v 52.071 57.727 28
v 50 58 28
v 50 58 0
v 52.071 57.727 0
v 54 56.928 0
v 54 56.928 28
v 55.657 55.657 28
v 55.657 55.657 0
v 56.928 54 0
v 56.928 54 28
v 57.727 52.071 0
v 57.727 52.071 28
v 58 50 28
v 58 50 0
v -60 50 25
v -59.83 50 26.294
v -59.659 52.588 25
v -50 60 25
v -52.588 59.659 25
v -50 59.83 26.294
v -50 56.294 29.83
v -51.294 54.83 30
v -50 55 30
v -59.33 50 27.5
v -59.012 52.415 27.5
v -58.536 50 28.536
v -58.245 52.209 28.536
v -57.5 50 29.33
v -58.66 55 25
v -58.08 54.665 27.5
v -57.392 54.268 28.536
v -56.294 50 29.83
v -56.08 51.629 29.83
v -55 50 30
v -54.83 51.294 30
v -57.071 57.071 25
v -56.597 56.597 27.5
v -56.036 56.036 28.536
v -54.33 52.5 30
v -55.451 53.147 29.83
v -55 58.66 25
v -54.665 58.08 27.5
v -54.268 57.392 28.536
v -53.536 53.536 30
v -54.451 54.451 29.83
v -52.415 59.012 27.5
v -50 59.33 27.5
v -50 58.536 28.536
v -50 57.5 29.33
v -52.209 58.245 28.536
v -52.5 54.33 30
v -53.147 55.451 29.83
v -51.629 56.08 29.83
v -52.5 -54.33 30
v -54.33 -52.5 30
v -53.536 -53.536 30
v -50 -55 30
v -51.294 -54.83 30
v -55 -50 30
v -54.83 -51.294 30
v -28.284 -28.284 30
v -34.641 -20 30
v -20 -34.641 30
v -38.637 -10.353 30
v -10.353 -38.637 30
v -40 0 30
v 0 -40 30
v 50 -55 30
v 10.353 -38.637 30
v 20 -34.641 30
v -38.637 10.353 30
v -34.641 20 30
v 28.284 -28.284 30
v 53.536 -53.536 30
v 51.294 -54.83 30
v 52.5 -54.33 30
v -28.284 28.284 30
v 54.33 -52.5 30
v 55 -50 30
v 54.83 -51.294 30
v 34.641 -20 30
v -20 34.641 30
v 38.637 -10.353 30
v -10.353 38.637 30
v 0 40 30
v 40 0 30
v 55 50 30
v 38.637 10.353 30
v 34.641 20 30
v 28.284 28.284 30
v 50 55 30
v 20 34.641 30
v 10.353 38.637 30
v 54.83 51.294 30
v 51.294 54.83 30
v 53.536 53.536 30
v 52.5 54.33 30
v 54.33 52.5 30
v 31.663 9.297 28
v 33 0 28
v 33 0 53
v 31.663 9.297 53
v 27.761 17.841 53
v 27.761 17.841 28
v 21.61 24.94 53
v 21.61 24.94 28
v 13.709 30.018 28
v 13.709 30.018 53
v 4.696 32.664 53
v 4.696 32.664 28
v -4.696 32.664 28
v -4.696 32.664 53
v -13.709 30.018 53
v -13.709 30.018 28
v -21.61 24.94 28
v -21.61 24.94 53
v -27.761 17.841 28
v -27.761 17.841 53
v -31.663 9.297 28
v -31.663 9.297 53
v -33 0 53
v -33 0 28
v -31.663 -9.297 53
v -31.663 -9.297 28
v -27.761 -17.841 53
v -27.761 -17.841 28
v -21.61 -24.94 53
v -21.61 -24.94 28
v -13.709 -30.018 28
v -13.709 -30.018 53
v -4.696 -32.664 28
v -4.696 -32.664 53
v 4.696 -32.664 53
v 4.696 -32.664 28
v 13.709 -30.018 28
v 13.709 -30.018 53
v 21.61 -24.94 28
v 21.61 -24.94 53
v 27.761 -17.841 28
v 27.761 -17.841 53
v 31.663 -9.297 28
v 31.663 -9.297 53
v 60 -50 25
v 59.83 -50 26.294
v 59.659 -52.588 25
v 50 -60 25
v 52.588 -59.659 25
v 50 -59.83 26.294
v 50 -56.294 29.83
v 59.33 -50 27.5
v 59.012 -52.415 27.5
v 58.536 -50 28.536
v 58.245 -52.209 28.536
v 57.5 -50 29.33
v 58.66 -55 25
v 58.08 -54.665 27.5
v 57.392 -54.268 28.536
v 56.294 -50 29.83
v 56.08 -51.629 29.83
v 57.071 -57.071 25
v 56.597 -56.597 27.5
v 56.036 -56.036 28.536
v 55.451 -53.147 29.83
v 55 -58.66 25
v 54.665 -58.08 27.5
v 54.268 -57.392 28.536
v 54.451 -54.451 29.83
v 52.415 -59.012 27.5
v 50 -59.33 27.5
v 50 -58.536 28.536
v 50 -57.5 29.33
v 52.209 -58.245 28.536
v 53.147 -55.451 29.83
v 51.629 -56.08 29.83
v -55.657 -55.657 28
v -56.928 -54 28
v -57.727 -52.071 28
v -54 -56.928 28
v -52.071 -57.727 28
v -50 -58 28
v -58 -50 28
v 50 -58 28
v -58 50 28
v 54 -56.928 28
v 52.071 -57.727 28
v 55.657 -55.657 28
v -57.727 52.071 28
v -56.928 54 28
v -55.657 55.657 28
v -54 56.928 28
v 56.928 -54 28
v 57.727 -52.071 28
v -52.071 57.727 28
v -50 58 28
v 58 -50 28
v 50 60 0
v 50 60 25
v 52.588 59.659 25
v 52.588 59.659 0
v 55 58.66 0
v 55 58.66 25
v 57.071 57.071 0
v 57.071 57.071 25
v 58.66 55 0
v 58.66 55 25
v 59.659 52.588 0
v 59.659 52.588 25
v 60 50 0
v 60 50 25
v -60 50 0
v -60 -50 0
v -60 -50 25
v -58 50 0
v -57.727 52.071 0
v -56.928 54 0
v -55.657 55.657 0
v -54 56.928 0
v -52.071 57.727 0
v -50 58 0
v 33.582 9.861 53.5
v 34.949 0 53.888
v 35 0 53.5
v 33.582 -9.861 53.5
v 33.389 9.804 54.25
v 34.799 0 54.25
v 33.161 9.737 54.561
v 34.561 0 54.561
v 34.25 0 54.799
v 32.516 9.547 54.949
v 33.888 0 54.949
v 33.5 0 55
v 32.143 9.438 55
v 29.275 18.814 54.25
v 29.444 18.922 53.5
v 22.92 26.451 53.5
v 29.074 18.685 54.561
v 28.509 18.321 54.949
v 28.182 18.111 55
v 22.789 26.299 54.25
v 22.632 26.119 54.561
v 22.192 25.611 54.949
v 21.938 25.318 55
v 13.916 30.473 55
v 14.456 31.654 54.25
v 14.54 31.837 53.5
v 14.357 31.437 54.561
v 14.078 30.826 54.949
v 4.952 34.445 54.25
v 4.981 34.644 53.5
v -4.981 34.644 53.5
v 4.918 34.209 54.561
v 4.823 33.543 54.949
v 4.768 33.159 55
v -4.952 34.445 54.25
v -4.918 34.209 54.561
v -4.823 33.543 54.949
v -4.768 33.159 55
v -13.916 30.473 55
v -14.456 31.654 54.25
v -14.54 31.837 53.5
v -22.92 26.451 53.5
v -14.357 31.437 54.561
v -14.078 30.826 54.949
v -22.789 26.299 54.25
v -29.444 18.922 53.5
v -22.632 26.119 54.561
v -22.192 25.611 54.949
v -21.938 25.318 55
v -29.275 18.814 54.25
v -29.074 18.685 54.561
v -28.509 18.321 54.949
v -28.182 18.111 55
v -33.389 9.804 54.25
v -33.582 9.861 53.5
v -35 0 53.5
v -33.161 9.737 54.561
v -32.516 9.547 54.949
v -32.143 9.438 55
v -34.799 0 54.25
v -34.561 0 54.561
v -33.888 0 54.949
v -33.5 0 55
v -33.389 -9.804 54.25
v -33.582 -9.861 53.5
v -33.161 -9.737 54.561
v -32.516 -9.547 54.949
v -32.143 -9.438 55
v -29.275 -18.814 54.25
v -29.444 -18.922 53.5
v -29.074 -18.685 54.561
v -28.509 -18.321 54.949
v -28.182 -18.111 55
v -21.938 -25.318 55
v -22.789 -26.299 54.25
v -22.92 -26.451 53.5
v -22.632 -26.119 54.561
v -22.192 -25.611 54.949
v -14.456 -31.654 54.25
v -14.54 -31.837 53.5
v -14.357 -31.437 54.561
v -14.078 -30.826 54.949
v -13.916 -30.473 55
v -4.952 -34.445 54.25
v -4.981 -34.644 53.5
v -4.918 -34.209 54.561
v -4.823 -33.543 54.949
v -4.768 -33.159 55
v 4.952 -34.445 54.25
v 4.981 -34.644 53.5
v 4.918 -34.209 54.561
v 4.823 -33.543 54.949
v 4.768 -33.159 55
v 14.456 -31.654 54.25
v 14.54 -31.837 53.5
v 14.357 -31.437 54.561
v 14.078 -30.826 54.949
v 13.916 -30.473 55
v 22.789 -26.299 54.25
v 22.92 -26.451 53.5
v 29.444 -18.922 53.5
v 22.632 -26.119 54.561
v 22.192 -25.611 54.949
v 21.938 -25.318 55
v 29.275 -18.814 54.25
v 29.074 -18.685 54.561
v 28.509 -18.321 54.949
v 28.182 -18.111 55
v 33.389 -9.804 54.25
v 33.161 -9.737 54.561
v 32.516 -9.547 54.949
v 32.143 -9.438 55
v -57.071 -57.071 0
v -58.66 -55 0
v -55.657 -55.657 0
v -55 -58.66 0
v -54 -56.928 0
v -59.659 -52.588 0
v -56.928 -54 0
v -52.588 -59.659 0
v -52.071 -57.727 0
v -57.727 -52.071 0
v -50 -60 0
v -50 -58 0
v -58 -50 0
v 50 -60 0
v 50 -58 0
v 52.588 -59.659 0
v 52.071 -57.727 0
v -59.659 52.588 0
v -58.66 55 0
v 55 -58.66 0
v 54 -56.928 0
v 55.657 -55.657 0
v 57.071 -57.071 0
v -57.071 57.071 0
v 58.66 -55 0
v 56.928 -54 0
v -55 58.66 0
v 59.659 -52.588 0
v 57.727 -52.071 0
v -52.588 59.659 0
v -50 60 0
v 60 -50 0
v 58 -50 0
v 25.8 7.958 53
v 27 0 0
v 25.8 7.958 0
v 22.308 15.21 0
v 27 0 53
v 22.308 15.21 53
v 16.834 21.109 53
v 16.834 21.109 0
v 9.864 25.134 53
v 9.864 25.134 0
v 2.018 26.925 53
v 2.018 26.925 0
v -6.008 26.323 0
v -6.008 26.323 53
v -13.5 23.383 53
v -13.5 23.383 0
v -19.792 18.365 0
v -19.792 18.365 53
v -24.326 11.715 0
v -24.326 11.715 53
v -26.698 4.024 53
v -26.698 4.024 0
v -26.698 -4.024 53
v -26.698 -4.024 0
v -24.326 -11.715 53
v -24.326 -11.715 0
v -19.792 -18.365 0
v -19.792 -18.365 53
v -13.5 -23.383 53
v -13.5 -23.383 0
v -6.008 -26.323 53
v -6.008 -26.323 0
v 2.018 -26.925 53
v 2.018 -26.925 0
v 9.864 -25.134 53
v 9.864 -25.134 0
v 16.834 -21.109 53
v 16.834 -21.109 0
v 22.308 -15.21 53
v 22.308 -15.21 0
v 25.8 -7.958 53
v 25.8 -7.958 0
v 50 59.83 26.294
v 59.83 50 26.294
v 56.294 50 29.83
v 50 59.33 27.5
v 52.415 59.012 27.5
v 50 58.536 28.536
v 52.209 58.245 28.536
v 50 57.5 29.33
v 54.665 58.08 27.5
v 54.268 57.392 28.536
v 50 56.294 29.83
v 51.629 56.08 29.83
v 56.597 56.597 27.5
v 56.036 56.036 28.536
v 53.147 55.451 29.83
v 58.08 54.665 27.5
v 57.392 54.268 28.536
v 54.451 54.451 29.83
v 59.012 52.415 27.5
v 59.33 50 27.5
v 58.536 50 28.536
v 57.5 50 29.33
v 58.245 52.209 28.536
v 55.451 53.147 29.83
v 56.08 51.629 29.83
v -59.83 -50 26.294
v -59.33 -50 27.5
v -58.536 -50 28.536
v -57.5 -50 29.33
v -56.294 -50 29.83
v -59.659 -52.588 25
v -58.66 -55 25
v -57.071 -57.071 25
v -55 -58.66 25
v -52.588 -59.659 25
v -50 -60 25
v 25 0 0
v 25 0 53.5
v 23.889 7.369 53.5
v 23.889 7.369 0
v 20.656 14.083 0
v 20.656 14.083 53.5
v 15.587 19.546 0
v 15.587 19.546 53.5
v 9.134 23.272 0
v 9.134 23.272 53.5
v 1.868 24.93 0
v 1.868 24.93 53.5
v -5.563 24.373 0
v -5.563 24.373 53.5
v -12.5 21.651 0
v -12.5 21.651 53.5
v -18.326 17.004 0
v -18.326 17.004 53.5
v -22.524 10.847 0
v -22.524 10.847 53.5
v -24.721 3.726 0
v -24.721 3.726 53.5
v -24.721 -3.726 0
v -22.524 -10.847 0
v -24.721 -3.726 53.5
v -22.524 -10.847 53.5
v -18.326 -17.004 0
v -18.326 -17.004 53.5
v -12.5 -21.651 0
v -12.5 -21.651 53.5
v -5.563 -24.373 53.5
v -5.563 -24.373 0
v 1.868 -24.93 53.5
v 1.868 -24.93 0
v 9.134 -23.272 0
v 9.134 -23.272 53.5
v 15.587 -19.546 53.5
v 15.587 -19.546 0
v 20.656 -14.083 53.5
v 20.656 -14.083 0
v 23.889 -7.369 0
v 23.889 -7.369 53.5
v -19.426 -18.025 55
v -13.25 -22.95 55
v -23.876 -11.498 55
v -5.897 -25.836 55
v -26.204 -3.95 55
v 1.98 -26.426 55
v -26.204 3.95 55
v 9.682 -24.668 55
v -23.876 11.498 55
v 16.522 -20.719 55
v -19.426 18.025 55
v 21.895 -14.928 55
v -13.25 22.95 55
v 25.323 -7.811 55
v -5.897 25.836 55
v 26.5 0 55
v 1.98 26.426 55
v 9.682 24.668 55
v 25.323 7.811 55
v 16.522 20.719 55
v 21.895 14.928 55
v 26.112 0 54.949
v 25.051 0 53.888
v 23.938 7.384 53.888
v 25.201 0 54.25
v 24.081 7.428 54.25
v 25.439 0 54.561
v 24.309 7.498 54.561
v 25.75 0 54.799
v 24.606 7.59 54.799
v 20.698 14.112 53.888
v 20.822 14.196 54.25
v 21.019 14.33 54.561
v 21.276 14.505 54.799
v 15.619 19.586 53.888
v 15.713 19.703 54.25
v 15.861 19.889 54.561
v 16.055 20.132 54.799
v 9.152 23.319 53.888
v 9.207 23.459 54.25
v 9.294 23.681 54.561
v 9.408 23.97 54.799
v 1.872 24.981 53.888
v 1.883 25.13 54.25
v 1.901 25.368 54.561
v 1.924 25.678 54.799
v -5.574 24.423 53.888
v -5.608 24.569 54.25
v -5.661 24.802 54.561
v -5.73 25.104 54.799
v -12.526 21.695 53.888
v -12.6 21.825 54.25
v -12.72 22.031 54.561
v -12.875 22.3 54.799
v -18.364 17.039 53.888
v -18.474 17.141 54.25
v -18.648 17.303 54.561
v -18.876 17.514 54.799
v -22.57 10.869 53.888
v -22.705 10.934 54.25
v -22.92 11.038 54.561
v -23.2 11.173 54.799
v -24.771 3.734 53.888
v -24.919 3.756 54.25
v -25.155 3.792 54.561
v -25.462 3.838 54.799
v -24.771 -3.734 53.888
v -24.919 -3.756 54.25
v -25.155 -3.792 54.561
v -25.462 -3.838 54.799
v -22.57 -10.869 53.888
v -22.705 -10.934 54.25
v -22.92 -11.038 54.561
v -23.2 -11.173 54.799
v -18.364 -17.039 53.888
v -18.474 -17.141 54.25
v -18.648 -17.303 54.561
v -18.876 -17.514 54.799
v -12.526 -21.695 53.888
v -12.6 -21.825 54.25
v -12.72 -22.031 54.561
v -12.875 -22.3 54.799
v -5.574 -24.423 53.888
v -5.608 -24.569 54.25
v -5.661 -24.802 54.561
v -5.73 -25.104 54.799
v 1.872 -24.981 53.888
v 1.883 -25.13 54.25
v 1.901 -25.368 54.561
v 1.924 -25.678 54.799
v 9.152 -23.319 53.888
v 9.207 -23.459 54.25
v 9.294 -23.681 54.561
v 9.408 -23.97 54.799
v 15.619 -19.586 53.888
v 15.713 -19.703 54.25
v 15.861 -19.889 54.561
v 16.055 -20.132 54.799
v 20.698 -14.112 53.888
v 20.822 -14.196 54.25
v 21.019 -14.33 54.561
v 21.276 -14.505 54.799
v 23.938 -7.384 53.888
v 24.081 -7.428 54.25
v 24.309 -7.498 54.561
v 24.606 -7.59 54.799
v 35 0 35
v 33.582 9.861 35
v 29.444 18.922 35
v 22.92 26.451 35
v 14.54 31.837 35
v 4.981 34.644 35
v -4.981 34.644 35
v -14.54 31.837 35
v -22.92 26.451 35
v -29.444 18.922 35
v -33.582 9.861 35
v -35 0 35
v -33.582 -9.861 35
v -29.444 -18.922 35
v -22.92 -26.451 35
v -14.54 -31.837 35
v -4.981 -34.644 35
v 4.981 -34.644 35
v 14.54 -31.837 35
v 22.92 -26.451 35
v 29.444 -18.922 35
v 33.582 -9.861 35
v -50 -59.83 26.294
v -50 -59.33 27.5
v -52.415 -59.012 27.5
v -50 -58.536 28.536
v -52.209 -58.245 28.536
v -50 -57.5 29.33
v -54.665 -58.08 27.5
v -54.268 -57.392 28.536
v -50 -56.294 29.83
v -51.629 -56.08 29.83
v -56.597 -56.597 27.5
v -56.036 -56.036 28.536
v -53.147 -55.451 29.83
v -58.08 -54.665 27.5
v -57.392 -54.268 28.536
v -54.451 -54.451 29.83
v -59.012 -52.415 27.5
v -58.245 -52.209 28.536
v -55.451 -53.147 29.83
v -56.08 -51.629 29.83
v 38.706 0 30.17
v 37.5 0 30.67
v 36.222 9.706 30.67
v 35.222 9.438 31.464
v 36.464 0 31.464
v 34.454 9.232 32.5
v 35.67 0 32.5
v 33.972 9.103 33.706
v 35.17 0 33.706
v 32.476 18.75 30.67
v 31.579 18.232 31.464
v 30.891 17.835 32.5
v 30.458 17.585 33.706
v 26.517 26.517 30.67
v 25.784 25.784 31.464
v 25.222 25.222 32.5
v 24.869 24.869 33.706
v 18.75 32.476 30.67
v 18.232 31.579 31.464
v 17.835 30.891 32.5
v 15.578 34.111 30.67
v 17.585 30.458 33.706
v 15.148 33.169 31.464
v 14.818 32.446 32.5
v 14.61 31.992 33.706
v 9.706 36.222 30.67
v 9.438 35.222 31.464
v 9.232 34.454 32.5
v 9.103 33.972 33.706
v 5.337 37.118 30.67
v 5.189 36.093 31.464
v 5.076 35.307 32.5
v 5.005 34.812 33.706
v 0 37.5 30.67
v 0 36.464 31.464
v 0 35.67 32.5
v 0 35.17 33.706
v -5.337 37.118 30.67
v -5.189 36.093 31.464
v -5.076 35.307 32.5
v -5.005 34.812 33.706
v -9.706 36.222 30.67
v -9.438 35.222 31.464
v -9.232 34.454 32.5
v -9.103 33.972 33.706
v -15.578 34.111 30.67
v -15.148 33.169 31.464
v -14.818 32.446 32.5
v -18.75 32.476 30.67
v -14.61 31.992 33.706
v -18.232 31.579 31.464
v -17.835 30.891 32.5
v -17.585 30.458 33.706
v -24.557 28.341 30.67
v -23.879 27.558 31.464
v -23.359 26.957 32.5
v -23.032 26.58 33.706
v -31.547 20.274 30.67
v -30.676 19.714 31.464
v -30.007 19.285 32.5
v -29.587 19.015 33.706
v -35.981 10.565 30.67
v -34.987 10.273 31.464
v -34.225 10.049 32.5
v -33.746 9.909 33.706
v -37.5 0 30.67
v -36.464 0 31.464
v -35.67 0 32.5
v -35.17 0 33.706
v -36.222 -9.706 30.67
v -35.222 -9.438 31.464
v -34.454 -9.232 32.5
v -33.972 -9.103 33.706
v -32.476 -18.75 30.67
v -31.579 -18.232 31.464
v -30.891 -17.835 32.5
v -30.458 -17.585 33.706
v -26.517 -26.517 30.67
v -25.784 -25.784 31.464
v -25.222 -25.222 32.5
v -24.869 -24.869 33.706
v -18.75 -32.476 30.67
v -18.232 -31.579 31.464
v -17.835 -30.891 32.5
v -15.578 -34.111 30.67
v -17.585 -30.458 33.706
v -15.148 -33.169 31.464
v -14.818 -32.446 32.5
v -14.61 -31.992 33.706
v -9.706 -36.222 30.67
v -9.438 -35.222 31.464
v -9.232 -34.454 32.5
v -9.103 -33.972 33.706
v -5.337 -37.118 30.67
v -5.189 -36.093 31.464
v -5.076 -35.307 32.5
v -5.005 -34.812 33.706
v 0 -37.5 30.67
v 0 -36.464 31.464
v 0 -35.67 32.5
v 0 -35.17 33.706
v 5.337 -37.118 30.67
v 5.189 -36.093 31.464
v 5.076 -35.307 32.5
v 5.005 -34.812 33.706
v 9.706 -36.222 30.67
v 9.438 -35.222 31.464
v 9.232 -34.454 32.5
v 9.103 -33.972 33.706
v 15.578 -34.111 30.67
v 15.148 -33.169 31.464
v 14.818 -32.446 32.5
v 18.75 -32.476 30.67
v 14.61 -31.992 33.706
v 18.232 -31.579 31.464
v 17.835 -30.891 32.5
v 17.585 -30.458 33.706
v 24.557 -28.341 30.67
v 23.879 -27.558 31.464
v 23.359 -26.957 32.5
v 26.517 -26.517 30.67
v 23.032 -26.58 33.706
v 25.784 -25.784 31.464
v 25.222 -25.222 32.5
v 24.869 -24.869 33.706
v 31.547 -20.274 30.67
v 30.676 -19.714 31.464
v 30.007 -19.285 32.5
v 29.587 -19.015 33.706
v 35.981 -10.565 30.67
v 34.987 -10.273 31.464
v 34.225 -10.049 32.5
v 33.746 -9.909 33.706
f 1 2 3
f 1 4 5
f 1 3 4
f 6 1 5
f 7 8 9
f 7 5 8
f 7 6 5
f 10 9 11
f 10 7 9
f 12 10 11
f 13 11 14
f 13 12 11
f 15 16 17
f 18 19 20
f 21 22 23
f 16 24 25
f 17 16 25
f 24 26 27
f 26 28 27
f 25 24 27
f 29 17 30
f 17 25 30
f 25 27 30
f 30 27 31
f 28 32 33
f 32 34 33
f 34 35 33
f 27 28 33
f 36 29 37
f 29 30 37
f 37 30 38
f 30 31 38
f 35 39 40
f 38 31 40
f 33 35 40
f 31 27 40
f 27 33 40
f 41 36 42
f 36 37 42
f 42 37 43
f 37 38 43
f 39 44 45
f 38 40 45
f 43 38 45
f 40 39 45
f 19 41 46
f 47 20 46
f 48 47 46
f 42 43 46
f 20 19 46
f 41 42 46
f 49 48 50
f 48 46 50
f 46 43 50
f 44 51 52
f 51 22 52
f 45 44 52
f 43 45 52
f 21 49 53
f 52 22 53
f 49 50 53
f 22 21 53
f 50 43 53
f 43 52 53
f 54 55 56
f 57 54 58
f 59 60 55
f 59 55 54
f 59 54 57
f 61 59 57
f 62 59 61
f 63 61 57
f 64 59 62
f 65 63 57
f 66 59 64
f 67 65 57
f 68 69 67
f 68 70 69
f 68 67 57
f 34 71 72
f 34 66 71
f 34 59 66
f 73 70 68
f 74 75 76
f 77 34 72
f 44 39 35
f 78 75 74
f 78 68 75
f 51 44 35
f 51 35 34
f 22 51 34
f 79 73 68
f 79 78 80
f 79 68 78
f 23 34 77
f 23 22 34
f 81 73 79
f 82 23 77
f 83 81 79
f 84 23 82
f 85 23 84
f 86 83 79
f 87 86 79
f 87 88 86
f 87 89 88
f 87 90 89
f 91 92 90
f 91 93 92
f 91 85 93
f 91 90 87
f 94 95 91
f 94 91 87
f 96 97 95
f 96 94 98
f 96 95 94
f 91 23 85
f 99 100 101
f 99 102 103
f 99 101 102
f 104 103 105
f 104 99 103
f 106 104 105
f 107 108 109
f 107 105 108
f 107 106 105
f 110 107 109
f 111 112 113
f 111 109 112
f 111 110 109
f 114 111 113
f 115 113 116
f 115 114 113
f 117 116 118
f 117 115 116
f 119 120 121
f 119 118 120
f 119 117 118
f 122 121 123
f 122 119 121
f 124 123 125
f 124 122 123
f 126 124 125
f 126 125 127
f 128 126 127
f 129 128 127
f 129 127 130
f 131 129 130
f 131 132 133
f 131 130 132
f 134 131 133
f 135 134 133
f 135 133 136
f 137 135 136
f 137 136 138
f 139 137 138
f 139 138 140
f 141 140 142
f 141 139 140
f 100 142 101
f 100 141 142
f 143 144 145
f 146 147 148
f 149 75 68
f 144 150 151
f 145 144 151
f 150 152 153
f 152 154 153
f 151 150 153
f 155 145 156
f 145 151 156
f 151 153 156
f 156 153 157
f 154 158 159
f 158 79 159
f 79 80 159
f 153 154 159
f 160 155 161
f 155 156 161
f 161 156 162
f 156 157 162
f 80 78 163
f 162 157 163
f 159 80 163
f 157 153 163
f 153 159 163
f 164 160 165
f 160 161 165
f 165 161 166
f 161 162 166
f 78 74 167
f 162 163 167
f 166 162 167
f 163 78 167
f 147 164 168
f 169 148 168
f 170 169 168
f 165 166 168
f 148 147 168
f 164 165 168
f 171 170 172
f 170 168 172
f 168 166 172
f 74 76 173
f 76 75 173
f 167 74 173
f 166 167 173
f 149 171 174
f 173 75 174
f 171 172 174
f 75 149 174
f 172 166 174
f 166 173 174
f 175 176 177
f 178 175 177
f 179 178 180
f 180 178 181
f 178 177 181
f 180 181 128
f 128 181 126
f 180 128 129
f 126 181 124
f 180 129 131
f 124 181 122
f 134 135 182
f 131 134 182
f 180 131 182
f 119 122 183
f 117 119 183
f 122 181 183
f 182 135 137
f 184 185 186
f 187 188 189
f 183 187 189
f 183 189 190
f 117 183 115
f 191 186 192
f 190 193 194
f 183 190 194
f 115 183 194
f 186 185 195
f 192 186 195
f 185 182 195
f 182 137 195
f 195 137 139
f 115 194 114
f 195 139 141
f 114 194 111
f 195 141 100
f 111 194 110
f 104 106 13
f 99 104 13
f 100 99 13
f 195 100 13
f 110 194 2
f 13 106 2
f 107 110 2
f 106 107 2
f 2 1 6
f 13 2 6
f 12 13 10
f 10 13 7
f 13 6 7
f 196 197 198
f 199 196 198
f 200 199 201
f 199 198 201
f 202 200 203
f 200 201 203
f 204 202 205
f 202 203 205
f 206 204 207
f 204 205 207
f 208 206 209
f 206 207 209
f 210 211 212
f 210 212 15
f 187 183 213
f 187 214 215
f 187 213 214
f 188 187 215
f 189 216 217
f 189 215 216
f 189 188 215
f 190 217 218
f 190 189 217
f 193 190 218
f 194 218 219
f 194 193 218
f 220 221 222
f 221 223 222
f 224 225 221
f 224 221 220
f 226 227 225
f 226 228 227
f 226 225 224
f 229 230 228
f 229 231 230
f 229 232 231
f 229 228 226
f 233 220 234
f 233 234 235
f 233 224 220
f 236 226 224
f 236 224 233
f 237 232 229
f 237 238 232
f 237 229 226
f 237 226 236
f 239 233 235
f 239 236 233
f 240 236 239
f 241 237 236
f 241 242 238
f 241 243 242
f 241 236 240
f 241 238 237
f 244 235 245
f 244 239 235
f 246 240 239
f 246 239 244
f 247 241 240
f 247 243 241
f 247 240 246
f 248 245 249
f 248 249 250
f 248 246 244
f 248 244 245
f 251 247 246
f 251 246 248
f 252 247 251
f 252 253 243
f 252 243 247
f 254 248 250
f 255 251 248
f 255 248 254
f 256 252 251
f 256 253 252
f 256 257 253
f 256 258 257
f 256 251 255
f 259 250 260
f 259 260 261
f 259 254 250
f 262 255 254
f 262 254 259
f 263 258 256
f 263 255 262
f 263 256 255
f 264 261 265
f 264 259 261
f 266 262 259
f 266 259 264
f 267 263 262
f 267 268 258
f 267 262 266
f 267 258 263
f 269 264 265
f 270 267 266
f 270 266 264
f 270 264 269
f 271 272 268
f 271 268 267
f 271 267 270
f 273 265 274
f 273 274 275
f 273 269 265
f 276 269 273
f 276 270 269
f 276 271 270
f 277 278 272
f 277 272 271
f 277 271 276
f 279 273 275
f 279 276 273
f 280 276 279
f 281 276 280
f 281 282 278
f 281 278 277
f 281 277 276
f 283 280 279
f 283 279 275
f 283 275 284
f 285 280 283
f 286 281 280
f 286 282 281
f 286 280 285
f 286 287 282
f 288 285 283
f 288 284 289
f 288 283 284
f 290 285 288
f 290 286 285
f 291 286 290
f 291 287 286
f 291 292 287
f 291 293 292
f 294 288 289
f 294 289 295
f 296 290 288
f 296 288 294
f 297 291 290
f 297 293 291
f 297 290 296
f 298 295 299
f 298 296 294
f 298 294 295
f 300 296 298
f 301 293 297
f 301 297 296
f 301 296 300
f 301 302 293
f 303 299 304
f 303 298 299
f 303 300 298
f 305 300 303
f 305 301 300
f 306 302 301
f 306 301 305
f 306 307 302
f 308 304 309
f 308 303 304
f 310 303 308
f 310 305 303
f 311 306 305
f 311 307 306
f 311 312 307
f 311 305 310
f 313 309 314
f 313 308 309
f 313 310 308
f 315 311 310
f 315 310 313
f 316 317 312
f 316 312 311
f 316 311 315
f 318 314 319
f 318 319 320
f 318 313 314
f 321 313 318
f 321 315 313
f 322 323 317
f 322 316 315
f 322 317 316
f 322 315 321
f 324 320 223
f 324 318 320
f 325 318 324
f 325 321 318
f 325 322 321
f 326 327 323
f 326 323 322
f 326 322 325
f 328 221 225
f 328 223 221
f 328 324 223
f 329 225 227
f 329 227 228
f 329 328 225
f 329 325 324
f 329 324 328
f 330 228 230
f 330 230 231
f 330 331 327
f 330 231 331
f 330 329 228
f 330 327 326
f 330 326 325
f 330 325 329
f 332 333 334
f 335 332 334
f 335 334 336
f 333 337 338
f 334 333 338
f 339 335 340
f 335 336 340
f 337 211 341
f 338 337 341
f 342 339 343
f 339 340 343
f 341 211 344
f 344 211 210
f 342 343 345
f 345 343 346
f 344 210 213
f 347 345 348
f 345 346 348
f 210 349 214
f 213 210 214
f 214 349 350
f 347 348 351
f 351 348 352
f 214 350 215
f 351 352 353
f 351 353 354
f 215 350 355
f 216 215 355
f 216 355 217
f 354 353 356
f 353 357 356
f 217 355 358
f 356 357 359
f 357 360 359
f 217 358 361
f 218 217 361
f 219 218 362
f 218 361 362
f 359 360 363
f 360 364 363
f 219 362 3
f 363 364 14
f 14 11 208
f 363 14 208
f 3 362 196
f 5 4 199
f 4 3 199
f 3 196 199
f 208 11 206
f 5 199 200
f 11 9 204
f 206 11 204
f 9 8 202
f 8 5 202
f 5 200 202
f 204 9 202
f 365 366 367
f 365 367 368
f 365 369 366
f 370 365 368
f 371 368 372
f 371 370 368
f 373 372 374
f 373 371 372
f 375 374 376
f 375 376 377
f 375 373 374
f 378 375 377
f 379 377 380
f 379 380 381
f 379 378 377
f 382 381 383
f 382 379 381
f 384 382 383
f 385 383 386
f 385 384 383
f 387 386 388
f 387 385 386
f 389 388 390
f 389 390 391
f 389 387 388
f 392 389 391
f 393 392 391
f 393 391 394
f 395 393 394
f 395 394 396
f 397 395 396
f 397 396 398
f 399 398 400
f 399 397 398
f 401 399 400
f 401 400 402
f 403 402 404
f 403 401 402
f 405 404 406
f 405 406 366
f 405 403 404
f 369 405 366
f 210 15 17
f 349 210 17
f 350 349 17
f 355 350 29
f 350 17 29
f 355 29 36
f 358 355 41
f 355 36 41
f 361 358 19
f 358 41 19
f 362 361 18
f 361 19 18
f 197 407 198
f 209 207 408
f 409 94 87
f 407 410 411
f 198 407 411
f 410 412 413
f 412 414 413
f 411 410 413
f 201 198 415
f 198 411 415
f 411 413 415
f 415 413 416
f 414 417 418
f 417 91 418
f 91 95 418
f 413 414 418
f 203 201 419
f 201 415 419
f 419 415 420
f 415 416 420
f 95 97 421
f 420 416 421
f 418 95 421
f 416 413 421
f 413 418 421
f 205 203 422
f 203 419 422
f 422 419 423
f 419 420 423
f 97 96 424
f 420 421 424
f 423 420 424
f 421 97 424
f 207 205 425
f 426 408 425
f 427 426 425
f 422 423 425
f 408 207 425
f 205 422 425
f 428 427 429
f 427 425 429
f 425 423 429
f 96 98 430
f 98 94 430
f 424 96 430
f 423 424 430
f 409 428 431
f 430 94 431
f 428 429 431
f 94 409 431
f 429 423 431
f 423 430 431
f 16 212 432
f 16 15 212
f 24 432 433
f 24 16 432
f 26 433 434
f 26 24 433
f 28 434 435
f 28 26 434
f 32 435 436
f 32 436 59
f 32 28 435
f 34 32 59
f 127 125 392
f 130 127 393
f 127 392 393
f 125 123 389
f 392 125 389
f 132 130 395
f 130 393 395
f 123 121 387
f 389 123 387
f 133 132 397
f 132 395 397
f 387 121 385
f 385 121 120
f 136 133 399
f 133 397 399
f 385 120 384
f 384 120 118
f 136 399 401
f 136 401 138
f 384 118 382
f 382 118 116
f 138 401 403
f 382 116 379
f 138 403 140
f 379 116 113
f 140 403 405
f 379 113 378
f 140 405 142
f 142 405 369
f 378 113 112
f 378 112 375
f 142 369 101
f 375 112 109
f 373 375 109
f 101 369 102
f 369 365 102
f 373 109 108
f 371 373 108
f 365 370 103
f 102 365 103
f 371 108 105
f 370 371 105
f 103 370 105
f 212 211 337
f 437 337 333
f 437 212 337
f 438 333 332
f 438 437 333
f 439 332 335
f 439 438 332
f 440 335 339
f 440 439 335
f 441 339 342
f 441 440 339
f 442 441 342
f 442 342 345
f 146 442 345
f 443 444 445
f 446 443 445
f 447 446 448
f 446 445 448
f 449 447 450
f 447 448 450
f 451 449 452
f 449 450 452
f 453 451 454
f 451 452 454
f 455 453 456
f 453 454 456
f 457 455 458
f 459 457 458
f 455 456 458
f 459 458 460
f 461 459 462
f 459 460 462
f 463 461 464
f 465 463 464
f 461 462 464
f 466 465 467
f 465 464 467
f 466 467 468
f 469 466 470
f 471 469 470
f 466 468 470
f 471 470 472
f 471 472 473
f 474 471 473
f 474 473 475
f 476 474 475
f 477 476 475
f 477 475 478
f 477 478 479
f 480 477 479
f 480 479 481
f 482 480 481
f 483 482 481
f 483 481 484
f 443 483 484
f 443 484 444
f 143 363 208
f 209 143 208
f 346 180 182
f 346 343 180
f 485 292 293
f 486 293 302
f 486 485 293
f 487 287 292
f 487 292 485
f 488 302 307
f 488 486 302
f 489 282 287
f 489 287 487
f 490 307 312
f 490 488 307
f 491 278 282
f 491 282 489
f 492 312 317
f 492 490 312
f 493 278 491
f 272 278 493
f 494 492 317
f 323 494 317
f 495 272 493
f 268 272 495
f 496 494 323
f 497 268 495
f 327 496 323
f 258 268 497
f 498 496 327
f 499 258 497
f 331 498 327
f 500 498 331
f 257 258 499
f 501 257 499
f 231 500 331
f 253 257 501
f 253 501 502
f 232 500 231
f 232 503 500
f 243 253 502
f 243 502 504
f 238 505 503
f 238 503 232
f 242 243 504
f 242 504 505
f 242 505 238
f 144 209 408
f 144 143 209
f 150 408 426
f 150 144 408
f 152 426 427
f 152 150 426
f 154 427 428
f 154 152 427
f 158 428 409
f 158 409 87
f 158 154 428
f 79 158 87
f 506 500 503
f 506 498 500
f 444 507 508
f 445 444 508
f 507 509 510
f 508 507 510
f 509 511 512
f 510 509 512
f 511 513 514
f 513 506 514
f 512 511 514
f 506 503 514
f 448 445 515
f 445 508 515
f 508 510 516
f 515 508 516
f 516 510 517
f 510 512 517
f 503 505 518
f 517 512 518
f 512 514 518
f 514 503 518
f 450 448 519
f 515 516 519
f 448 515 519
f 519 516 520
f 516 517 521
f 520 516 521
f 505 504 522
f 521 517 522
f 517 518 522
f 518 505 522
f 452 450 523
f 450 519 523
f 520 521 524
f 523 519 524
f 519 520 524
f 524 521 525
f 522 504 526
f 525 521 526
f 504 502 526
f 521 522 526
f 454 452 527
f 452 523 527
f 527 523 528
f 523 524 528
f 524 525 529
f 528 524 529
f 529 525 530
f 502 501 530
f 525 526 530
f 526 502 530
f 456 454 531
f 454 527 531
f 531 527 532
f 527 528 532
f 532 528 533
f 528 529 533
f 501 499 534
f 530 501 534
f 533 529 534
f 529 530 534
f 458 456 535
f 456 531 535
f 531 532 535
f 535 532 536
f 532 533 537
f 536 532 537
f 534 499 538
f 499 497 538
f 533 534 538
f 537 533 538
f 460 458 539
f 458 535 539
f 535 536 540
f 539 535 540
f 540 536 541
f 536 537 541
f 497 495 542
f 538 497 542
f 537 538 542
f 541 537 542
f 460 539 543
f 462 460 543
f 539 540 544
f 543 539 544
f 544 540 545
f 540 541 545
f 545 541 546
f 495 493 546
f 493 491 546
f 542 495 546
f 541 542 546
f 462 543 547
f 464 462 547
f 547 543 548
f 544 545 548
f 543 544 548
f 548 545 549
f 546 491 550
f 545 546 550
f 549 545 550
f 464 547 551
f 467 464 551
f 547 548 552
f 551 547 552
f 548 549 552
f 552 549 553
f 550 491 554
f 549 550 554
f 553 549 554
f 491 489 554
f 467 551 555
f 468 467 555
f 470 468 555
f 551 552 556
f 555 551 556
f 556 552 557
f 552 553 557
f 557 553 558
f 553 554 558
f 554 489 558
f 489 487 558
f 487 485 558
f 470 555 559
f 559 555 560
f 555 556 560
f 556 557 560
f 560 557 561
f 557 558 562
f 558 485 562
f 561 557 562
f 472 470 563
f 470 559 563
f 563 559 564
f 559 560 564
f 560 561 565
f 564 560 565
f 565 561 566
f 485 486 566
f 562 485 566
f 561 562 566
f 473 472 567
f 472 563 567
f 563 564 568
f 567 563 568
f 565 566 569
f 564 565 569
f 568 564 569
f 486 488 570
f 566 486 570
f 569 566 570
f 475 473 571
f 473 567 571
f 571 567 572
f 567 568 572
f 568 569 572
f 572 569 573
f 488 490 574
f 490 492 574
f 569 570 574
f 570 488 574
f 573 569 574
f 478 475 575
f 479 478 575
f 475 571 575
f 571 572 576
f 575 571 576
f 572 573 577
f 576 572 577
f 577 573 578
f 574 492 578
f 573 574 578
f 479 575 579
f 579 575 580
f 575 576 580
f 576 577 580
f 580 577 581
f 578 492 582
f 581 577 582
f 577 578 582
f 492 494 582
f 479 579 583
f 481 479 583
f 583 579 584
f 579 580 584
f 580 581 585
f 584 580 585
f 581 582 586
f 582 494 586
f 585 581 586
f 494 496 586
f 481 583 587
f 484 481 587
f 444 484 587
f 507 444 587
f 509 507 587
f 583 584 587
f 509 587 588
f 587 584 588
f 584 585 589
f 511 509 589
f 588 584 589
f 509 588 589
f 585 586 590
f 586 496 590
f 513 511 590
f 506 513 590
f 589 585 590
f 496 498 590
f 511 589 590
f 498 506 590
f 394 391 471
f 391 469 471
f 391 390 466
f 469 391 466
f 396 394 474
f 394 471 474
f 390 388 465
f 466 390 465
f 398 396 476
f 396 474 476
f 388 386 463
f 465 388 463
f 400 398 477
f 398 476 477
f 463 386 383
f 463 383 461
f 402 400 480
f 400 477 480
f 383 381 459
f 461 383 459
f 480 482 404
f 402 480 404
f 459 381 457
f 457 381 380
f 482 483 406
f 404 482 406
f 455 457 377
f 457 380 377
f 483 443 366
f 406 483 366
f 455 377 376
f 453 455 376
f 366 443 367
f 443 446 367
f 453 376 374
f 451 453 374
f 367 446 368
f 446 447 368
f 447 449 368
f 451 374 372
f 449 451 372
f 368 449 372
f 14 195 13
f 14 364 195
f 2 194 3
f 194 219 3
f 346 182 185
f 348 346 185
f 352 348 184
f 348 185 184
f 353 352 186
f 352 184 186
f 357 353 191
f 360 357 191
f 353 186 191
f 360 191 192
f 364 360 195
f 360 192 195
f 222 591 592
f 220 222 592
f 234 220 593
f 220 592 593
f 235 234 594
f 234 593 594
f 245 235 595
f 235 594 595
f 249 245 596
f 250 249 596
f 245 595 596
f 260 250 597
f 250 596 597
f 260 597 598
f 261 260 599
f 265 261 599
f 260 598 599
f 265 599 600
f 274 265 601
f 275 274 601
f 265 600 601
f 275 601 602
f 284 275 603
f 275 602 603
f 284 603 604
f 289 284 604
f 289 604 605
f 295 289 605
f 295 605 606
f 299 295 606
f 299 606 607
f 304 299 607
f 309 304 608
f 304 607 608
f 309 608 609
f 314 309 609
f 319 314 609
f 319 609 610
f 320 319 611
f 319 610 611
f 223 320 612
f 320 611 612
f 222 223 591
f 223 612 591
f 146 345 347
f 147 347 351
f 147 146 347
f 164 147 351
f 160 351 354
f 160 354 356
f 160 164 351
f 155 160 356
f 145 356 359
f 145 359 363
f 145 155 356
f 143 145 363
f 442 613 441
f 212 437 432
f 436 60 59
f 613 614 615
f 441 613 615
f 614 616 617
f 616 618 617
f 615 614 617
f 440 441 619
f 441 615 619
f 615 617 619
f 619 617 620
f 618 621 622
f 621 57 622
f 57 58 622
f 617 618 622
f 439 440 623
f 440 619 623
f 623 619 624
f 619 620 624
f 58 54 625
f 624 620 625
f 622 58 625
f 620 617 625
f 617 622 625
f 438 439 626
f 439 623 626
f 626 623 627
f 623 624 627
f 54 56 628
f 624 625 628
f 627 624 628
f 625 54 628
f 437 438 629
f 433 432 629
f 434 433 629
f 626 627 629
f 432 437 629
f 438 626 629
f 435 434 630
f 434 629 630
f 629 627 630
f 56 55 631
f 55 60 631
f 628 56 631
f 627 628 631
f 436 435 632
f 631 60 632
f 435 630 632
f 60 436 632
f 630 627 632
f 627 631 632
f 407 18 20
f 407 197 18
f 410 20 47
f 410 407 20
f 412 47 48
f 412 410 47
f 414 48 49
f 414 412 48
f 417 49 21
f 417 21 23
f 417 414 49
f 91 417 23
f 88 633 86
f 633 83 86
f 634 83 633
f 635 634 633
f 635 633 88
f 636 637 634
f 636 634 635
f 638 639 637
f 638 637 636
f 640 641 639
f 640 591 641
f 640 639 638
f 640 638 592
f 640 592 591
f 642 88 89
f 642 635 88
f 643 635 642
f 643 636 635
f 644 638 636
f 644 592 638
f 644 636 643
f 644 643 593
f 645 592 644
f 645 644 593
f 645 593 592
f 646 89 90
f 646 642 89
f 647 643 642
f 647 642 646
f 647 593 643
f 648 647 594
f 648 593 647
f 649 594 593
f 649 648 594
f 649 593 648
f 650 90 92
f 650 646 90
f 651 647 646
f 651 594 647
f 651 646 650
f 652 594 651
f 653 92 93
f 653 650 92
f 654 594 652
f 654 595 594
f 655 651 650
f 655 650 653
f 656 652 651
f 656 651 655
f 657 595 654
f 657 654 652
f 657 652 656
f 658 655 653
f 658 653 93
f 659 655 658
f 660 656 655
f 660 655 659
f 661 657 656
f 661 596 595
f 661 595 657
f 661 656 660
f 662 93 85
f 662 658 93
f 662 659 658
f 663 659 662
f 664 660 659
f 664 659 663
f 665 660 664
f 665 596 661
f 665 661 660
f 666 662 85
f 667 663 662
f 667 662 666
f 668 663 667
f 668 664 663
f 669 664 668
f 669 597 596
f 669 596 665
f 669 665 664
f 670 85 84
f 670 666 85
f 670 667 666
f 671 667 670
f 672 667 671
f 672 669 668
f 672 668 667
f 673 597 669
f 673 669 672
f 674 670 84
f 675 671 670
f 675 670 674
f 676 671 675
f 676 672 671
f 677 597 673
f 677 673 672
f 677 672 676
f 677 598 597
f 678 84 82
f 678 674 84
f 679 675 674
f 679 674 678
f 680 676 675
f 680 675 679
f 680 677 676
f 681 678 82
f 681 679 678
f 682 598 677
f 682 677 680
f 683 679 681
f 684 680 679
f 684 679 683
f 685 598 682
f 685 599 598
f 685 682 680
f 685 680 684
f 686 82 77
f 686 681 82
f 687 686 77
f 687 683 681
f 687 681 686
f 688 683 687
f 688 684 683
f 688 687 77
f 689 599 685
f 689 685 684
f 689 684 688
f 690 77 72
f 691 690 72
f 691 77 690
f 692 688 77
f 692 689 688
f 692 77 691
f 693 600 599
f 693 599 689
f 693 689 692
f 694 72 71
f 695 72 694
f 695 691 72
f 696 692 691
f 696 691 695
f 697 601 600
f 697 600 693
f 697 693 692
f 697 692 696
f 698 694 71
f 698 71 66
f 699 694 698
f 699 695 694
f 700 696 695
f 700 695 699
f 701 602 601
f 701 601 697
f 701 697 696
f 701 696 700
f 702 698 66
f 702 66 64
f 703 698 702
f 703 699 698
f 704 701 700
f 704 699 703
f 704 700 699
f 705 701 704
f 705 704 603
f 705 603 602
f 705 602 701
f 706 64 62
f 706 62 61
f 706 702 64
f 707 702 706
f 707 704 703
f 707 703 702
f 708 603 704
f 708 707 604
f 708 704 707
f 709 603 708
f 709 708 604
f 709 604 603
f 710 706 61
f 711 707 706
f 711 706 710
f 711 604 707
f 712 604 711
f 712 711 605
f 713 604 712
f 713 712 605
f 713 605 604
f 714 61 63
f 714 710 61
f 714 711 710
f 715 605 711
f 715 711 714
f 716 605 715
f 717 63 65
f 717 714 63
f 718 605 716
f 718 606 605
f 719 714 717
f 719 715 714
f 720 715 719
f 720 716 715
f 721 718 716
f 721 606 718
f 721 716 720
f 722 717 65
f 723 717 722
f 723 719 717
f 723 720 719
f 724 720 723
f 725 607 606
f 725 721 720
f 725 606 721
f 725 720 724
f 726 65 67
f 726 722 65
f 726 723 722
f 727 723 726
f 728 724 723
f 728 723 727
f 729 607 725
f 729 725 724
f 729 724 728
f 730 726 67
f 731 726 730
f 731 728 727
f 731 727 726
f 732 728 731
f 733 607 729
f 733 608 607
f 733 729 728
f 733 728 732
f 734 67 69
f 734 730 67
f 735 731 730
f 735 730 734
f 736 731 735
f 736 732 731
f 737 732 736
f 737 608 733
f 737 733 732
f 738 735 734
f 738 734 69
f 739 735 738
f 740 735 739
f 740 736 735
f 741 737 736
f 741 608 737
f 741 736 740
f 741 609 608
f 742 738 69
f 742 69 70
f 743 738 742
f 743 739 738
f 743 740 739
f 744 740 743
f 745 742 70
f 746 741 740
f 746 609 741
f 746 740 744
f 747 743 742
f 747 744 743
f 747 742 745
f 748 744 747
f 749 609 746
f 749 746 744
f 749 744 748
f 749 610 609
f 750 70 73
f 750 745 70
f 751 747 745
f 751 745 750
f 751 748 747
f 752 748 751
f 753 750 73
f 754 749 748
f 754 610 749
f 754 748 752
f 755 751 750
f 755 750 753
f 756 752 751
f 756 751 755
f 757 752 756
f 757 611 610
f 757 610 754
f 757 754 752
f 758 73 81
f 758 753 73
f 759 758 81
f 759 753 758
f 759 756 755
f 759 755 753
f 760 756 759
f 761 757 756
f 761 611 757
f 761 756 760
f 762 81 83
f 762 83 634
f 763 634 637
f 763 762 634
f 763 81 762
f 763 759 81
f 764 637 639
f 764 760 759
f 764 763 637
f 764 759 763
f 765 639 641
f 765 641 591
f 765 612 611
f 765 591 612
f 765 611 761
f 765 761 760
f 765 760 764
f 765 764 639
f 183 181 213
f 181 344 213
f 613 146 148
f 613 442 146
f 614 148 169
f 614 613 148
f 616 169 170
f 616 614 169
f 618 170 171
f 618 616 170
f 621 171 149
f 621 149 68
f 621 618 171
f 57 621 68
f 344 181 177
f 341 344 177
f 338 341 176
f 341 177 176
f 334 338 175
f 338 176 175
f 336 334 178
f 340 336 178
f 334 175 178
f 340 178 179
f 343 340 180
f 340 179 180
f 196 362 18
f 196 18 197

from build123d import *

# Parameters (mm, degrees)
SKETCH3_W           = 120
SKETCH3_H           = 120
BOSS_EXTRUDE1_DEPTH = 30
SKETCH4_R           = 35
BOSS_EXTRUDE2_DEPTH = 25
SKETCH5_R           = 25
CUT_EXTRUDE1_DEPTH  = 102.118742081
FILLET2_R           = 1.5
FILLET3_R           = 10
SHELL1_T            = -2
FILLET4_R           = 5


with BuildPart() as part:
    # Sketch3 → Boss-Extrude1 (new body)
    with BuildSketch(Plane.XY):
        Rectangle(SKETCH3_W, SKETCH3_H)
    extrude(amount=BOSS_EXTRUDE1_DEPTH)

    # Sketch4 → Boss-Extrude2 (add)
    with BuildSketch(Plane.XY.offset(30)):
        Circle(SKETCH4_R)
    extrude(amount=BOSS_EXTRUDE2_DEPTH)

    # Sketch5 → Cut-Extrude1 (cut, through all)
    with BuildSketch(Plane.XY.offset(55)):
        Circle(SKETCH5_R)
    extrude(amount=-CUT_EXTRUDE1_DEPTH, mode=Mode.SUBTRACT)

    # Fillet2
    fillet2_edges = [part.edges().sort_by_distance(p)[0] for p in [
        (-35, 0, 55),
        (-25, 0, 55),
    ]]
    fillet(fillet2_edges, radius=FILLET2_R)

    # Fillet3
    fillet3_edges = [part.edges().sort_by_distance(p)[0] for p in [
        (-60, -60, 15),
        (60, -60, 15),
        (60, 60, 15),
        (-60, 60, 15),
    ]]
    fillet(fillet3_edges, radius=FILLET3_R)

    # Shell1
    shell1_openings = [part.faces().sort_by_distance(p)[0] for p in [
        (0, -58.302943725, 0),
    ]]
    offset(amount=SHELL1_T, openings=shell1_openings, kind=Kind.INTERSECTION)

    # Fillet4
    fillet4_edges = [part.edges().sort_by_distance(p)[0] for p in [
        (-35, 0, 30),
        (-60, 0, 30),
        (0, 60, 30),
        (0, -60, 30),
        (60, 0, 30),
        (57.071067812, 57.071067812, 30),
        (57.071067812, -57.071067812, 30),
        (-57.071067812, -57.071067812, 30),
        (-57.071067812, 57.071067812, 30),
    ]]
    fillet(fillet4_edges, radius=FILLET4_R)


solid = part.part
